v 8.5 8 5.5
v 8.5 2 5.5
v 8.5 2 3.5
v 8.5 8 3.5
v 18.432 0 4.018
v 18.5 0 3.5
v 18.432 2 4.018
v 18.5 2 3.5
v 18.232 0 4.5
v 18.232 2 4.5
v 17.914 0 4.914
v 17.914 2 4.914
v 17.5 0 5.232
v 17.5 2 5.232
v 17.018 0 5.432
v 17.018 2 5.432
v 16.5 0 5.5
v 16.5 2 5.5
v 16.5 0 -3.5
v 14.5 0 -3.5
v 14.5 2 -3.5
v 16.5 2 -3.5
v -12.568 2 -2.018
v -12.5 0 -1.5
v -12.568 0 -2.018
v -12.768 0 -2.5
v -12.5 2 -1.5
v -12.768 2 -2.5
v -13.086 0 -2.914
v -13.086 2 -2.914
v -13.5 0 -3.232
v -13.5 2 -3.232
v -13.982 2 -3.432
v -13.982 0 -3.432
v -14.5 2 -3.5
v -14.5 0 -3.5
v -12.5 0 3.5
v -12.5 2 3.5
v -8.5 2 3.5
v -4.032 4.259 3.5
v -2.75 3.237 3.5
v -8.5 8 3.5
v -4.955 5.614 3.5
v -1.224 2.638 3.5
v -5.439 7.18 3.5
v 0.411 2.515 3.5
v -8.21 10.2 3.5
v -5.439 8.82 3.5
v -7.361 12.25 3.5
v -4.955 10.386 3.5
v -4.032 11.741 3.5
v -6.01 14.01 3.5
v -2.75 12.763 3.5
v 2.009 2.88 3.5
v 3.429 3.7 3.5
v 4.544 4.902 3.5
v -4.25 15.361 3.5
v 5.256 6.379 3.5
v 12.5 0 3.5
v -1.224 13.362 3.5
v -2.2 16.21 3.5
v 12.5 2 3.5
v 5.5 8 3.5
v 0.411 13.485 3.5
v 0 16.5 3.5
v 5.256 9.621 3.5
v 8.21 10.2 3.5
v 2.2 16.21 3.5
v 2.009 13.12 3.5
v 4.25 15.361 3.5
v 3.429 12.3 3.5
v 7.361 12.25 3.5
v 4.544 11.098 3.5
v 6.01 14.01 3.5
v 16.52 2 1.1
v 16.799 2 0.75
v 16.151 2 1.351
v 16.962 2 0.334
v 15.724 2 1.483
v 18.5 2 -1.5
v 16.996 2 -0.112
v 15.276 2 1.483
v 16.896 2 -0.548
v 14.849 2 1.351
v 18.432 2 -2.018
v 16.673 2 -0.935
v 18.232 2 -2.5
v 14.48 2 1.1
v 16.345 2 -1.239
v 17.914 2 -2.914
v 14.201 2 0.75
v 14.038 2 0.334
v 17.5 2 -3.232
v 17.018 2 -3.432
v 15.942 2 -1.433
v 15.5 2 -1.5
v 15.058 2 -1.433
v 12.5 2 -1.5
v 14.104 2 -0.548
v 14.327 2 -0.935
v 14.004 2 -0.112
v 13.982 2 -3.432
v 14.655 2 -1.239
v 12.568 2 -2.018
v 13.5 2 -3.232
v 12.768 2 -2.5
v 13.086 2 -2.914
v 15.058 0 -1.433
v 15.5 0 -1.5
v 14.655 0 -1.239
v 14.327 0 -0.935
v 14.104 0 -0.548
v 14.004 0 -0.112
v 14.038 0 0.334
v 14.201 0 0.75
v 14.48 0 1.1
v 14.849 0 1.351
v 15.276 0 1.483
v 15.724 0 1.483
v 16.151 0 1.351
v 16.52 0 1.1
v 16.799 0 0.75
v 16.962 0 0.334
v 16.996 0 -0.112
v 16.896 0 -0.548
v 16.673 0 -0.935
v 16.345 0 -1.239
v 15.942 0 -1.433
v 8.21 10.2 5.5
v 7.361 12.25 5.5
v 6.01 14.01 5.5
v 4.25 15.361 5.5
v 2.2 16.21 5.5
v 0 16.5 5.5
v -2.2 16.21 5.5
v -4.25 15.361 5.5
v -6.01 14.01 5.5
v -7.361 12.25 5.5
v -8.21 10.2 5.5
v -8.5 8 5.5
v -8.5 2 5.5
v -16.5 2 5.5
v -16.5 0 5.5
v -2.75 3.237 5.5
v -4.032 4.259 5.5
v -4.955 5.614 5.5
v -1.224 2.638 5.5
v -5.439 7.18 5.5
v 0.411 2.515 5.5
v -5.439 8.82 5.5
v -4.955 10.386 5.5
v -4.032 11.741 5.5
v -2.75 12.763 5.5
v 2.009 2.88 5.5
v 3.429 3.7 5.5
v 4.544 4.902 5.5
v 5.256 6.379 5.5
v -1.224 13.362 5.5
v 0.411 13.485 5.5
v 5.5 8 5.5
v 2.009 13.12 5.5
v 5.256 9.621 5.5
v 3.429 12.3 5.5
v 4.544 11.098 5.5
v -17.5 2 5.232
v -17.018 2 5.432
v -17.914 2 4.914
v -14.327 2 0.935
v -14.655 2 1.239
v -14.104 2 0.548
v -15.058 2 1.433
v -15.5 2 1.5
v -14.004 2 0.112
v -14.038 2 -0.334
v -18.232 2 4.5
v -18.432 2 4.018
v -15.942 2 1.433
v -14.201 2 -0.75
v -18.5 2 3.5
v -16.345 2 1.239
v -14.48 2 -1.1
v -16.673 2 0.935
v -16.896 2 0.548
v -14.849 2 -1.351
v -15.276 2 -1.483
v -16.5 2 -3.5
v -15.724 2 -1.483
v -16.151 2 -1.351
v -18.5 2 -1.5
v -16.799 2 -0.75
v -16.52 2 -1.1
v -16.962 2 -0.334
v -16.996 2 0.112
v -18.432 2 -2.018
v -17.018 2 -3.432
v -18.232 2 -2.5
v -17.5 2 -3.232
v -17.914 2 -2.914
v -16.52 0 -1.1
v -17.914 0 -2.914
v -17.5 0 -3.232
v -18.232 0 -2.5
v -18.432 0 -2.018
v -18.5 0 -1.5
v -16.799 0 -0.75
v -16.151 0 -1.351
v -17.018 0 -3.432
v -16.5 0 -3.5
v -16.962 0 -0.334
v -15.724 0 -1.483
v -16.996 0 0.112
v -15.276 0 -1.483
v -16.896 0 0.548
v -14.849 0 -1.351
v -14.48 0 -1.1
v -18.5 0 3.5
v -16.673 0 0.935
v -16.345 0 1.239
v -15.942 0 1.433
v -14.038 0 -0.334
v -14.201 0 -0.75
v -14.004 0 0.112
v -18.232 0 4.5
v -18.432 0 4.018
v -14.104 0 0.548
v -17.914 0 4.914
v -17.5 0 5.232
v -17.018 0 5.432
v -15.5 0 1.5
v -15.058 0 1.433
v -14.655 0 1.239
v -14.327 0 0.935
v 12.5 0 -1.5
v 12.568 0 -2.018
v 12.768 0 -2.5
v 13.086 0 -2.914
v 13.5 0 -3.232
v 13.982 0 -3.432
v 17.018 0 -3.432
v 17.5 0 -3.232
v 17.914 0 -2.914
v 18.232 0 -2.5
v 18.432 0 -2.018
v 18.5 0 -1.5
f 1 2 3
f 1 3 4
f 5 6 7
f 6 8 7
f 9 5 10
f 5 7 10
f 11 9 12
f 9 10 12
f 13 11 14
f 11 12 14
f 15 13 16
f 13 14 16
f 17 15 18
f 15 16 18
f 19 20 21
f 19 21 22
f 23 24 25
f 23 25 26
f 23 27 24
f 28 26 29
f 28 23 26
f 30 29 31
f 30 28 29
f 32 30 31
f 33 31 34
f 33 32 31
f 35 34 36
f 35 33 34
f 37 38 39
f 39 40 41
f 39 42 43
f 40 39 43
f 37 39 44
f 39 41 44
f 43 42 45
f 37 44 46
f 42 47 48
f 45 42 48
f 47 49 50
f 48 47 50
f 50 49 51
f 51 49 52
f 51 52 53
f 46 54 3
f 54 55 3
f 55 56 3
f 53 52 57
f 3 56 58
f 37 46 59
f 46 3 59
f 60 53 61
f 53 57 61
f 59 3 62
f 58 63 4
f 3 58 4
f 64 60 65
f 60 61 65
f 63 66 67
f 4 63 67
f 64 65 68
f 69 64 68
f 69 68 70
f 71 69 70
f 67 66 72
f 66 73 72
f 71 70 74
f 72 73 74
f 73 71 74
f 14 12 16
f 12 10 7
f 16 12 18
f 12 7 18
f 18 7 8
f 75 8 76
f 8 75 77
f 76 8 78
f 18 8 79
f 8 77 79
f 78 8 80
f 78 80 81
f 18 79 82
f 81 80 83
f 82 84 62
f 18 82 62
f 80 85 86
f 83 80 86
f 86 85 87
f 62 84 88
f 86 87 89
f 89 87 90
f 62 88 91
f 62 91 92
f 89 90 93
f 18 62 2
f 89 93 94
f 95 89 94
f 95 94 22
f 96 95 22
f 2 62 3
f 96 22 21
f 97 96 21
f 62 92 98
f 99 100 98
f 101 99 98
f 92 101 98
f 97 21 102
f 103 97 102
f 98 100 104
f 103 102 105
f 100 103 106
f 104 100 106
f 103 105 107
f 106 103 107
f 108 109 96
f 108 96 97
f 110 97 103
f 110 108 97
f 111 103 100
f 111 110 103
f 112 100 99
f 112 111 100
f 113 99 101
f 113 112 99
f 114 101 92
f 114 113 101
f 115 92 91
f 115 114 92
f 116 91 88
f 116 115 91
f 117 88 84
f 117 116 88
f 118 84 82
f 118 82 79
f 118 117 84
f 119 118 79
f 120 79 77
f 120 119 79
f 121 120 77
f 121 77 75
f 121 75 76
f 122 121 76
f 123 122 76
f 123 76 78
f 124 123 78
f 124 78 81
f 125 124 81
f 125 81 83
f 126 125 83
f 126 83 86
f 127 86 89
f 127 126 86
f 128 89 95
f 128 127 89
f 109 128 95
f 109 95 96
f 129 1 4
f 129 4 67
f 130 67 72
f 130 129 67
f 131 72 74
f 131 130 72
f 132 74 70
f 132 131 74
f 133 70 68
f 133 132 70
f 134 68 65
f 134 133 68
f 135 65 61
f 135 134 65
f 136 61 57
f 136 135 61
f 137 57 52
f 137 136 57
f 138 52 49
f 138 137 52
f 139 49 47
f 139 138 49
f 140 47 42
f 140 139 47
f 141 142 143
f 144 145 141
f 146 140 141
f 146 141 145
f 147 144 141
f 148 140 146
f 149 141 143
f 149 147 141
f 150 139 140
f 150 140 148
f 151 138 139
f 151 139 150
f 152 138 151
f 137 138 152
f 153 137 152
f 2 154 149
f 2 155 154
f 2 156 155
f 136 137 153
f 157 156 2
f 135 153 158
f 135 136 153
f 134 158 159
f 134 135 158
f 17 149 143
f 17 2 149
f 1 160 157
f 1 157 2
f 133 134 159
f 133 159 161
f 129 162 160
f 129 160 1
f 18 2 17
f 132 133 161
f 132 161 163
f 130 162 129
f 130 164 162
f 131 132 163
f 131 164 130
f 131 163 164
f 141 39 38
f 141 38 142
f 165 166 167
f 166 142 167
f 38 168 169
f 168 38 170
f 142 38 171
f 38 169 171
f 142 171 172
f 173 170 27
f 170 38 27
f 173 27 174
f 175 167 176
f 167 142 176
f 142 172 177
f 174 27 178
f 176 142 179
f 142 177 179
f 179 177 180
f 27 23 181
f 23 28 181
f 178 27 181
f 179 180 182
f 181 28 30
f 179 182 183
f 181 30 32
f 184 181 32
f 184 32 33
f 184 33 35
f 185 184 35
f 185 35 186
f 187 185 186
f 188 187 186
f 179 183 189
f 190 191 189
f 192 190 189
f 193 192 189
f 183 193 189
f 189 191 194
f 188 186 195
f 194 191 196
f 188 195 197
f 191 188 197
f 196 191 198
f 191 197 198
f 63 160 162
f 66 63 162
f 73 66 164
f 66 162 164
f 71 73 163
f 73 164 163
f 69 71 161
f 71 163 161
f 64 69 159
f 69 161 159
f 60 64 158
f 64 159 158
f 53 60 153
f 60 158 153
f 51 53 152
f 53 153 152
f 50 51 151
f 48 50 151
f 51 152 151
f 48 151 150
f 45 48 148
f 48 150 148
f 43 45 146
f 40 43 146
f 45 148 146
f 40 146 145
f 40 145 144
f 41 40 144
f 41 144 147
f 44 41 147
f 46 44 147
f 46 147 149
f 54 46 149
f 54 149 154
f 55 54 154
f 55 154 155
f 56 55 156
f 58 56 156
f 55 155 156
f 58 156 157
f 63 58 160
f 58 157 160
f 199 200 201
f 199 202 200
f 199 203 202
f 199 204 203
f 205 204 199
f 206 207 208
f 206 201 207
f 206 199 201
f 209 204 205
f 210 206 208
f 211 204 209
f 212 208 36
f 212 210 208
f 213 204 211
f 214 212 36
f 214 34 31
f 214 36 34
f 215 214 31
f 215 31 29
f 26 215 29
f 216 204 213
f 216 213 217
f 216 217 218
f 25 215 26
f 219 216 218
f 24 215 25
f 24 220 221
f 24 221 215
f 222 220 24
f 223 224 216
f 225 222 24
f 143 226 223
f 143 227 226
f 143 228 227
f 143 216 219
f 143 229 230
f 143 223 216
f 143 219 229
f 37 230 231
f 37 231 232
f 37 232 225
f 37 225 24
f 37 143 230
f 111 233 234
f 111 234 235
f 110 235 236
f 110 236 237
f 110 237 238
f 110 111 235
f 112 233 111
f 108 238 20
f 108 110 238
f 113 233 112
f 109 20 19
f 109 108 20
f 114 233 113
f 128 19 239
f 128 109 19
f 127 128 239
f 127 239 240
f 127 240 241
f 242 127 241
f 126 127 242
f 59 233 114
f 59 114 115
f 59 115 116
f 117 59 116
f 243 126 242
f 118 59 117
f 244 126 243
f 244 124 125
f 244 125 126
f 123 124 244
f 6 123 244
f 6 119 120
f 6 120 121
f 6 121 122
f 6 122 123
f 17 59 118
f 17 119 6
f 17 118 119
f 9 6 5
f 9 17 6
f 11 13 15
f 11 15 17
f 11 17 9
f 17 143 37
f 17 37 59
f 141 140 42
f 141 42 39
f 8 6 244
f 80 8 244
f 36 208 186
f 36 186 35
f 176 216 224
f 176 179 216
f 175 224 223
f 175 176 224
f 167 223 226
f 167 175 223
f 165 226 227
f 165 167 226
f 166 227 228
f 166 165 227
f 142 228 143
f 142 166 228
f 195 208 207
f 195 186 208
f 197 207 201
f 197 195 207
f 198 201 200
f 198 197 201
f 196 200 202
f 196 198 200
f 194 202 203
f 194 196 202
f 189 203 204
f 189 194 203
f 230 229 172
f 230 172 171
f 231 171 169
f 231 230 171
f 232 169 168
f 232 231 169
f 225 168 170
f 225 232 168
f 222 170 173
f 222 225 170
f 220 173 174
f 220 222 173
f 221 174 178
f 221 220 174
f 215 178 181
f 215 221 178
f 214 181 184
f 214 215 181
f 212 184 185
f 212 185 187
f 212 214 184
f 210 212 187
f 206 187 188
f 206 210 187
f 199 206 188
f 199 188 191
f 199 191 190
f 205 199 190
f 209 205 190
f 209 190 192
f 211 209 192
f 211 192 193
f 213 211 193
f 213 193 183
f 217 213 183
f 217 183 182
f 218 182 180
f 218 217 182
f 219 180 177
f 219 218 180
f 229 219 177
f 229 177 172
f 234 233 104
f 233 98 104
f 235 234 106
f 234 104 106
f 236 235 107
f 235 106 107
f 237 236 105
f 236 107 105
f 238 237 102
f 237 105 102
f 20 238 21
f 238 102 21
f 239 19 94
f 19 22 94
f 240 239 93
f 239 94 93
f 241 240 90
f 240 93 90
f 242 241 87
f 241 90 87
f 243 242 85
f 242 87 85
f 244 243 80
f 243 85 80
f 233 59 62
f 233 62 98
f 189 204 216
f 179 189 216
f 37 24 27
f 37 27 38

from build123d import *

# Parameters (mm, degrees)
SKETCH_1_R      = 1.5
EXTRUDE_1_DEPTH = 2
SKETCH_2_R      = 5.5
EXTRUDE_2_DEPTH = 2
FILLET_1_R      = 2


with BuildPart() as part:
    # 草图1 → 凸台-拉伸1 (new body)
    with BuildSketch(Plane(origin=(0, 0, 0), x_dir=(1, 0, 0), z_dir=(0, 1, 0))):
        Polygon((-12.5, -3.5), (12.5, -3.5), (12.5, 3.5), (18.5, 3.5), (18.5, -3.5), (18.5, -5.5), (-18.5, -5.5), (-18.5, -3.5), (-18.5, 3.5), (-12.5, 3.5), align=None)
        with Locations(Location((-15.5, 0, 0), (0, 0, 270))):
            Circle(SKETCH_1_R, mode=Mode.SUBTRACT)
        with Locations(Location((15.5, 0, 0), (0, 0, 90))):
            Circle(SKETCH_1_R, mode=Mode.SUBTRACT)
    extrude(amount=EXTRUDE_1_DEPTH)

    # 草图2 → 凸台-拉伸2 (add)
    with BuildSketch(Plane.XY.offset(5.5)):
        with BuildLine():
            Line((-8.5, 8), (-8.5, 0))
            Line((-8.5, 0), (8.5, 0))
            Line((8.5, 0), (8.5, 8))
            ThreePointArc((8.5, 8), (0, 16.5), (-8.5, 8))
        make_face()
        with Locations((0, 8)):
            Circle(SKETCH_2_R, mode=Mode.SUBTRACT)
    extrude(amount=-EXTRUDE_2_DEPTH)

    # 圆角1
    fillet_1_edges = [part.edges().sort_by_distance(p)[0] for p in [
        (12.5, 1, -3.5),
        (18.5, 1, -3.5),
        (18.5, 1, 5.5),
        (-18.5, 1, 5.5),
        (-18.5, 1, -3.5),
        (-12.5, 1, -3.5),
    ]]
    fillet(fillet_1_edges, radius=FILLET_1_R)


solid = part.part
